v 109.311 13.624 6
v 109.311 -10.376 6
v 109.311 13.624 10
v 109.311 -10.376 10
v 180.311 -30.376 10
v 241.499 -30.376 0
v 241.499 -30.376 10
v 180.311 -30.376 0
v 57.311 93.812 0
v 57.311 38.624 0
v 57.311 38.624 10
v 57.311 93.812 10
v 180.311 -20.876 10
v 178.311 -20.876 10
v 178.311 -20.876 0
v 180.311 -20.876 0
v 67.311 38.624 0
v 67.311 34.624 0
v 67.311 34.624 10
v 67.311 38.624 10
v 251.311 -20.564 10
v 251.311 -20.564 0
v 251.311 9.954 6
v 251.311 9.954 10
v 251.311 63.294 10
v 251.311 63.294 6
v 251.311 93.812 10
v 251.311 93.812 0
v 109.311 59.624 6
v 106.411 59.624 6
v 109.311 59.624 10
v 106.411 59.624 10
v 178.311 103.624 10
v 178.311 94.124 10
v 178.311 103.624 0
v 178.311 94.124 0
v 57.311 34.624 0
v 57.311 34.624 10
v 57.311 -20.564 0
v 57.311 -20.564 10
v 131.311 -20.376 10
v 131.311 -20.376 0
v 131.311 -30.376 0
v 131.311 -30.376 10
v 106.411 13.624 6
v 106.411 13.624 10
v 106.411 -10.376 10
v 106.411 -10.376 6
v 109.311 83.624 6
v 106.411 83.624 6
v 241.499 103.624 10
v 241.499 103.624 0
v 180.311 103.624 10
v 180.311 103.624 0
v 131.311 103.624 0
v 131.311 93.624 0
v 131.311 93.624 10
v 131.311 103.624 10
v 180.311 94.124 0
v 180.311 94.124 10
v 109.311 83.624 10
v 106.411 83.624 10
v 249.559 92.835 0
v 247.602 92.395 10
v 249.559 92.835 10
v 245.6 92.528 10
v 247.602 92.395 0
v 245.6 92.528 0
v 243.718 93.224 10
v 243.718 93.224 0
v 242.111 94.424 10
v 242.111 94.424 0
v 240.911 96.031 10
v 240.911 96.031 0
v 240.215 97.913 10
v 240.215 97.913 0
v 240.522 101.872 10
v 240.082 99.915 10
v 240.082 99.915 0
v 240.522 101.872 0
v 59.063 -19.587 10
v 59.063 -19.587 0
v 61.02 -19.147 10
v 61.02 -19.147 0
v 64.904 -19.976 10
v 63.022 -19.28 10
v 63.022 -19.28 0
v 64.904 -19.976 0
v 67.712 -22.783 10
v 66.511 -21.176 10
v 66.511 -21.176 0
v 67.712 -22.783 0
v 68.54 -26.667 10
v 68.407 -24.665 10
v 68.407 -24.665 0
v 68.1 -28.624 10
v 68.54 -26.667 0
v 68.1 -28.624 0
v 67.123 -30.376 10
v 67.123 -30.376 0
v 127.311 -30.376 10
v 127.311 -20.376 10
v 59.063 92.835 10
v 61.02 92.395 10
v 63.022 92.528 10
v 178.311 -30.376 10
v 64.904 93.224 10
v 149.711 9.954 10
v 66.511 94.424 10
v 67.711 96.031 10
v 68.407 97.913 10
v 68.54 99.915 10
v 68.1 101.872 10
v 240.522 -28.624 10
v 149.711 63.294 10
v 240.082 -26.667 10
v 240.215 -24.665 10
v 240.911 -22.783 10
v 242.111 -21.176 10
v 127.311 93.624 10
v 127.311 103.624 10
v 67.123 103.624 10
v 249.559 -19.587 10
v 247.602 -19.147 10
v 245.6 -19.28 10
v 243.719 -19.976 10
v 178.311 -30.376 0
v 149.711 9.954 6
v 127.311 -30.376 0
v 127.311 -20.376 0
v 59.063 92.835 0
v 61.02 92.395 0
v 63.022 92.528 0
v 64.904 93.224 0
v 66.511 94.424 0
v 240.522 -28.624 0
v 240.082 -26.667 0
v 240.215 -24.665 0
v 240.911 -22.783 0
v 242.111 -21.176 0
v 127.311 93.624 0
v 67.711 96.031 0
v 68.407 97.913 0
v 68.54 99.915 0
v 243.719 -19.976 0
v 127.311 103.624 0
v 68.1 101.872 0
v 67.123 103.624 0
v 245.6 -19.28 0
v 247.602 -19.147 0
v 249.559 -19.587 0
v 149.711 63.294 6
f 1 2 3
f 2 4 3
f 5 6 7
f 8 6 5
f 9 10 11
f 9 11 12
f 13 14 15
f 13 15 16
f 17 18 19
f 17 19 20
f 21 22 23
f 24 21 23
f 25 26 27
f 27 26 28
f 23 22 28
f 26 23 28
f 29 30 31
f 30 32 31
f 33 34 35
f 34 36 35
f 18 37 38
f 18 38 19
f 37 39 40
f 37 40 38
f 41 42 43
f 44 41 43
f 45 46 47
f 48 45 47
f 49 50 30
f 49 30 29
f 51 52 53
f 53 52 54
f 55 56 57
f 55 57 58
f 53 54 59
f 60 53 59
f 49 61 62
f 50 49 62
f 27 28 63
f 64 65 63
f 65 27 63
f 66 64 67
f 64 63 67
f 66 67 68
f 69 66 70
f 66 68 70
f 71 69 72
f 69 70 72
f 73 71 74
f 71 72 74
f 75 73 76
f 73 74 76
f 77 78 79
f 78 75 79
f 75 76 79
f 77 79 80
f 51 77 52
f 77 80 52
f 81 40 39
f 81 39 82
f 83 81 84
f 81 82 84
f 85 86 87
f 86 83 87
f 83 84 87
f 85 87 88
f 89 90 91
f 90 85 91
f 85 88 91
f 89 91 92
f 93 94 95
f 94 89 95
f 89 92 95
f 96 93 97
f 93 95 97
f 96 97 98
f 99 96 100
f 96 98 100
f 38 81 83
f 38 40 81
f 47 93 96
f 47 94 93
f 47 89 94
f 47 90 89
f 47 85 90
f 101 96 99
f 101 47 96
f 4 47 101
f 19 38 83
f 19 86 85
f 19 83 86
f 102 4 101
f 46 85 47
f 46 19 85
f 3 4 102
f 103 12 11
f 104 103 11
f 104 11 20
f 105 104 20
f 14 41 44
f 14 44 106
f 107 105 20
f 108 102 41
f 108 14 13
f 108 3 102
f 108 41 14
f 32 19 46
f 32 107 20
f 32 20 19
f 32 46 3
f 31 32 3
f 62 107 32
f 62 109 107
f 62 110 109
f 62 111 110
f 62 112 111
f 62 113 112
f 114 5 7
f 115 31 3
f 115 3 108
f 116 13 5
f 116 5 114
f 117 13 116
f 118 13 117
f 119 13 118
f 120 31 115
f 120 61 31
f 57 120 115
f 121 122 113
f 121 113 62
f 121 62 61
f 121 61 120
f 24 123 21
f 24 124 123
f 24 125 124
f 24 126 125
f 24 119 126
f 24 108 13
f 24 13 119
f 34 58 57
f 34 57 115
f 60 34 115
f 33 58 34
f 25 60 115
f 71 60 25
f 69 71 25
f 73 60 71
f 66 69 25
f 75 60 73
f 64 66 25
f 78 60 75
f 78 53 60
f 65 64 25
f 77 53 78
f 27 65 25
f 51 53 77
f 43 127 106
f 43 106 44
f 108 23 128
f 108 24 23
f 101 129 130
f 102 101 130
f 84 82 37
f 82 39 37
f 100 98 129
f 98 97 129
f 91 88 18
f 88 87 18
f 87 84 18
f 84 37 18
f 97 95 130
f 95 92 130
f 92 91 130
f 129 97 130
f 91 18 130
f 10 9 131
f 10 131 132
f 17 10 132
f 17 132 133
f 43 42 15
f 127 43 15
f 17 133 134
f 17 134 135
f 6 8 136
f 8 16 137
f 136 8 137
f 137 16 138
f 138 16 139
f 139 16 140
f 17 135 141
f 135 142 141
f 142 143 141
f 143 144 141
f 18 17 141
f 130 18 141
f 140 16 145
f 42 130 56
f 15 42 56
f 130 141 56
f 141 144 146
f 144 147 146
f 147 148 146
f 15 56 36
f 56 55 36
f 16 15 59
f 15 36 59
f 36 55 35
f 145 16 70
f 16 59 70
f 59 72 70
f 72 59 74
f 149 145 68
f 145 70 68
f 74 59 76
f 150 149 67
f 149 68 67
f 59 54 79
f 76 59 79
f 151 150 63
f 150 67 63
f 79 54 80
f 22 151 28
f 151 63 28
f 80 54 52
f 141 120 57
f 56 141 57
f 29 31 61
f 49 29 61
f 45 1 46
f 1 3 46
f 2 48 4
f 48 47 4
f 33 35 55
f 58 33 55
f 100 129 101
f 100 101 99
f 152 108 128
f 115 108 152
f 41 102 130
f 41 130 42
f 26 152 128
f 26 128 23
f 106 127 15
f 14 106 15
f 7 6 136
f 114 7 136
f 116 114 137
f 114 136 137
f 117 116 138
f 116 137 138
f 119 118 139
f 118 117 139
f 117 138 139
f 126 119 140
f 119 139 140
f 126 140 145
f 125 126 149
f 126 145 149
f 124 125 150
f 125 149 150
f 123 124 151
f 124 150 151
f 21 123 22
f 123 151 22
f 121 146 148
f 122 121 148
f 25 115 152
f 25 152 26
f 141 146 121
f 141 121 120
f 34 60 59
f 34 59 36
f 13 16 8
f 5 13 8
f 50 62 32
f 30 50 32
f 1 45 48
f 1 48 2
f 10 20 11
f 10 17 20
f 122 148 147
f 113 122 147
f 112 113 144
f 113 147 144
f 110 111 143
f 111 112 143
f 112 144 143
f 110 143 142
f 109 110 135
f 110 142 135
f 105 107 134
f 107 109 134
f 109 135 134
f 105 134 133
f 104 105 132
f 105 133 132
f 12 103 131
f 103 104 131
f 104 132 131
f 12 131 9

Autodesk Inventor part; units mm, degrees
ref_plane "YZ Plane" through (0, 0, 0) normal (1, 0, 0) x (0, 1, 0)
ref_plane "XZ Plane" through (0, 0, 0) normal (0, 1, 0) x (-1, 0, 0)
ref_plane "XY Plane" through (0, 0, 0) normal (0, 0, 1) x (1, 0, 0)
sketch "Эскиз1" plane through (0, 0, 0) normal (0, 0, 1) x (1, 0, 0)
  line L0 (174.3111, 41.624) -> (229.3111, 41.624) projected
  line L1 (229.3111, 41.624) -> (229.3111, 31.624) projected
  line L2 (229.3111, 31.624) -> (174.3111, 31.624) projected
  line L3 (174.3111, 41.624) -> (174.3111, 31.624) projected
  line L4 (149.3111, 46.624) -> (159.3111, 46.624) projected
  line L5 (149.3111, 46.624) -> (149.3111, 86.624) projected
  line L6 (149.3111, 86.624) -> (159.3111, 86.624) projected
  line L7 (159.3111, 86.624) -> (159.3111, 46.624) projected
  line L8 (134.3111, 31.624) -> (134.3111, 41.624) projected
  line L9 (134.3111, 31.624) -> (79.3111, 31.624) projected
  line L10 (79.3111, 31.624) -> (79.3111, 41.624) projected
  line L11 (79.3111, 41.624) -> (134.3111, 41.624) projected
  line L12 (251.3111, -20.5639) -> (251.3111, 93.8118) projected
  arc A0 (241.499, 103.624) -> (251.3111, 93.8118) centre (247.0611, 99.374) ccw projected
  line L13 (241.499, 103.624) -> (180.3111, 103.624) projected
  line L14 (180.3111, 103.624) -> (180.3111, 94.124) projected
  line L15 (180.3111, 94.124) -> (178.3111, 94.124) projected
  line L16 (178.3111, 94.124) -> (178.3111, 103.624) projected
  line L17 (178.3111, 103.624) -> (130.3111, 103.624) projected
  line L18 (130.3111, 103.624) -> (130.3111, 94.124) projected
  line L19 (130.3111, 94.124) -> (128.3111, 94.124) projected
  line L20 (128.3111, 94.124) -> (128.3111, 103.624) projected
  line L21 (128.3111, 103.624) -> (67.1233, 103.624) projected
  arc A1 (57.3111, 93.8118) -> (67.1233, 103.624) centre (61.5611, 99.374) ccw projected
  line L22 (57.3111, -20.5639) -> (57.3111, 93.8118) projected
  arc A2 (67.1233, -30.376) -> (57.3111, -20.5639) centre (61.5611, -26.126) ccw projected
  line L23 (128.3111, -30.376) -> (67.1233, -30.376) projected
  line L24 (128.3111, -30.376) -> (128.3111, -20.876) projected
  line L25 (128.3111, -20.876) -> (130.3111, -20.876) projected
  line L26 (130.3111, -20.876) -> (130.3111, -30.376) projected
  line L27 (178.3111, -30.376) -> (130.3111, -30.376) projected
  line L28 (178.3111, -30.376) -> (178.3111, -20.876) projected
  line L29 (178.3111, -20.876) -> (180.3111, -20.876) projected
  line L30 (180.3111, -20.876) -> (180.3111, -30.376) projected
  line L31 (241.499, -30.376) -> (180.3111, -30.376) projected
  arc A3 (251.3111, -20.5639) -> (241.499, -30.376) centre (247.0611, -26.126) ccw projected
  circle A4 centre (229.3111, 86.624) radius 5 projected
  circle A5 centre (79.3111, -13.376) radius 5 projected
  circle A6 centre (79.3111, 86.624) radius 5 projected
  circle A7 centre (229.3111, -13.376) radius 5 projected
  line L32 (159.3111, 26.624) -> (149.3111, 26.624) projected
  line L33 (159.3111, 26.624) -> (159.3111, -13.376) projected
  line L34 (159.3111, -13.376) -> (149.3111, -13.376) projected
  line L35 (149.3111, -13.376) -> (149.3111, 26.624) projected
  line L36 (241.499, 103.624) -> (67.1233, 103.624)
  line L37 (57.3111, 93.8118) -> (57.3111, -20.5639)
  line L38 (67.1233, -30.376) -> (241.499, -30.376)
  line L39 (251.3111, -20.5639) -> (251.3111, 93.8118)
  arc A8 (251.3111, -20.5639) -> (241.499, -30.376) centre (247.0611, -26.126) ccw
  arc A9 (67.1233, -30.376) -> (57.3111, -20.5639) centre (61.5611, -26.126) ccw
  arc A10 (57.3111, 93.8118) -> (67.1233, 103.624) centre (61.5611, 99.374) ccw
  arc A11 (241.499, 103.624) -> (251.3111, 93.8118) centre (247.0611, 99.374) ccw
  line L40 (57.3111, 35.624) -> (57.3111, 37.624) construction
  line L41 (251.3111, 35.624) -> (251.3111, 37.624) construction
  line L42 (181.3111, -30.376) -> (177.3111, -30.376)
  line L43 (177.3111, -30.376) -> (177.3111, -20.376)
  line L44 (177.3111, -20.376) -> (181.3111, -20.376)
  line L45 (181.3111, -20.376) -> (181.3111, -30.376)
  line L46 (131.3111, -30.376) -> (127.3111, -30.376)
  line L47 (127.3111, -30.376) -> (127.3111, -20.376)
  line L48 (127.3111, -20.376) -> (131.3111, -20.376)
  line L49 (131.3111, -20.376) -> (131.3111, -30.376)
  line L50 (57.3111, 34.624) -> (67.3111, 34.624)
  line L51 (67.3111, 34.624) -> (67.3111, 38.624)
  line L52 (67.3111, 38.624) -> (57.3111, 38.624)
  line L53 (57.3111, 38.624) -> (57.3111, 34.624)
  line L54 (131.3111, 103.624) -> (127.3111, 103.624)
  line L55 (127.3111, 103.624) -> (127.3111, 93.624)
  line L56 (127.3111, 93.624) -> (131.3111, 93.624)
  line L57 (131.3111, 93.624) -> (131.3111, 103.624)
  line L58 (181.3111, 103.624) -> (177.3111, 103.624)
  line L59 (177.3111, 103.624) -> (177.3111, 93.624)
  line L60 (177.3111, 93.624) -> (181.3111, 93.624)
  line L61 (181.3111, 93.624) -> (181.3111, 103.624)
  line L62 (251.3111, 38.624) -> (241.3111, 38.624)
  line L63 (241.3111, 38.624) -> (241.3111, 34.624)
  line L64 (241.3111, 34.624) -> (251.3111, 34.624)
  line L65 (251.3111, 34.624) -> (251.3111, 38.624)
  point P0 (0, 0)
  point P1 (154.3111, 103.624)
  point P2 (154.3111, -30.376)
  point P3 (57.3111, 36.624)
  point P4 (251.3111, 36.624)
  point P5 (179.3111, -20.376)
  point P6 (179.3111, -20.876)
  point P7 (129.3111, -20.376)
  point P8 (129.3111, -20.876)
  point P9 (67.3111, 36.624)
  point P10 (66.8111, 36.624)
  point P11 (129.3111, 93.624)
  point P12 (129.3111, 94.124)
  point P13 (179.3111, 93.624)
  point P14 (179.3111, 94.124)
  point P15 (241.3111, 36.624)
  point P16 (241.8111, 36.624)
  dimension "d0" = 4
  dimension "d1" = 10
  dimension "d2" = 10
  dimension "d3" = 4
  dimension "d4" = 10
  dimension "d5" = 4
  dimension "d6" = 10
  dimension "d7" = 4
  dimension "d8" = 4
  dimension "d9" = 10
  dimension "d10" = 10
  dimension "d11" = 4
extrude "Выдавливание1" add sketch "Эскиз1" along normal blind 10 contours L0 L1 L2 L3 | L5 L6 L7 L4 | L9 L10 L11 L8 | A3 L31 L45 L44 L43 L27 L49 L48 L47 L23 A2 L22 L50 L51 L52 A1 L21 L55 L56 L57 L17 L59 L60 L61 L13 A0 L12 L62 L63 L64 | L64 L63 L62 L12 | L31 L30 L29 L28 L27 L43 L44 L45 | L61 L60 L59 L17 L16 L15 L14 L13 | A4 | A5 | A6 | A7 | L33 L34 L35 L32
sketch "Эскиз2" plane through (0, 0, 10) normal (0, 0, 1) x (1, 0, 0)
  line L0 (251.3111, 9.954) -> (149.7111, 9.954)
  line L1 (149.7111, 9.954) -> (149.7111, 63.294)
  line L2 (149.7111, 63.294) -> (251.3111, 63.294)
  line L3 (251.3111, 63.294) -> (251.3111, 9.954)
  line L4 (251.3111, -20.5639) -> (251.3111, 35.624) projected
  line L5 (251.3111, 37.624) -> (251.3111, 93.8118) projected
  line L6 (251.3111, 35.624) -> (251.3111, 37.624) construction
  line L7 (154.7911, 9.954) -> (251.3111, 9.954) projected
  point P0 (0, 0)
  point P1 (251.3111, 36.624)
  dimension "d14" = 101.6
  dimension "d15" = 53.34
extrude "Выдавливание2" cut sketch "Эскиз2" against normal blind 4
sketch "Эскиз9" plane through (0, 0, 10) normal (0, 0, 1) x (1, 0, 0)
  line L0 (109.3111, 83.624) -> (107.3111, 83.624) projected
  line L1 (109.3111, 62.124) -> (109.3111, 81.124) projected
  line L2 (107.3111, 62.124) -> (107.3111, 81.124) projected
  line L3 (109.3111, 59.624) -> (107.3111, 59.624) projected
  line L4 (106.4111, 62.5941) -> (106.4111, 64.4694) projected
  line L5 (106.4111, 69.3382) -> (106.4111, 70.0888) projected
  line L6 (106.4111, 77.7718) -> (106.4111, 78.6108) projected
  line L7 (106.4111, 79.5822) -> (106.4111, 80.2887) projected
  line L8 (109.3111, 83.624) -> (106.4111, 83.624)
  line L9 (106.4111, 83.624) -> (106.4111, 59.624)
  line L10 (106.4111, 59.624) -> (109.3111, 59.624)
  line L11 (109.3111, 59.624) -> (109.3111, 83.624)
  point P0 (0, 0)
extrude "Выдавливание11" cut sketch "Эскиз9" against normal blind 4
pattern_linear "Прямоуг.массив1" count 2 spacing 70 along (0, -1, 0) of "Выдавливание11"
equation "\"d2\" = d1"
equation "\"d3\" = d0"
equation "\"d4\" = d2"
equation "\"d5\" = d3"
equation "\"d6\" = d4"
equation "\"d7\" = d5"
equation "\"d8\" = d7"
equation "\"d9\" = d6"
equation "\"d10\" = d1"
equation "\"d11\" = d0"
properties part number "Каркас"
